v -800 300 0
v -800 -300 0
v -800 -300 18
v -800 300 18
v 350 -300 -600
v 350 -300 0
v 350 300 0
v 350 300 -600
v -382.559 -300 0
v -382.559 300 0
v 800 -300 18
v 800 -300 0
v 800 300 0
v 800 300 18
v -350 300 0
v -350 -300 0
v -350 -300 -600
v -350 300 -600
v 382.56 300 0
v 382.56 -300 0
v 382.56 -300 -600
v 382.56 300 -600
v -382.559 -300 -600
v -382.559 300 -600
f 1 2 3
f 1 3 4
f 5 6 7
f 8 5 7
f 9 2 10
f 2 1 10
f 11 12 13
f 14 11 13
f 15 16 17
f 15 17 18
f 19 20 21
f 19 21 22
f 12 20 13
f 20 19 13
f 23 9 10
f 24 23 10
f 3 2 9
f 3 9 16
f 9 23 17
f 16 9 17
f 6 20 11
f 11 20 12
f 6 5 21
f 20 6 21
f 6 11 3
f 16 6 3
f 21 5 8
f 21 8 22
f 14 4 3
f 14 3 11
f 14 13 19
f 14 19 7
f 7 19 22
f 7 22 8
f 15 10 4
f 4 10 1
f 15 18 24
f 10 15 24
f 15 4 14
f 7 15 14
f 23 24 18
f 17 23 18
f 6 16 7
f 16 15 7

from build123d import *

# Parameters (mm, degrees)
F0_W     = 32.559776
F0_H     = 600
F0_W_2   = 417.440581
F0_W_3   = 32.559419
F0_W_4   = 417.440224
F0_W_5   = 700
F1_DEPTH = 18
F2_DEPTH = 600


with BuildPart() as f1:
    # F0 (on Top) → F1 (new body)
    with BuildSketch(Plane.XY):
        with Locations((366.279888, 0)):
            Rectangle(F0_W, F0_H)
        with Locations((-591.279709, 0)):
            Rectangle(F0_W_2, F0_H)
        with Locations((-366.279709, 0)):
            Rectangle(F0_W_3, F0_H)
        with Locations((591.279888, 0)):
            Rectangle(F0_W_4, F0_H)
        Rectangle(F0_W_5, F0_H)
    extrude(amount=F1_DEPTH)

    # F0 (on Top) → F2 (join)
    with BuildSketch(Plane.XY):
        with Locations((-366.279709, 0)):
            Rectangle(F0_W_3, F0_H)
        with Locations((366.279888, 0)):
            Rectangle(F0_W, F0_H)
    extrude(amount=-F2_DEPTH)


solid = f1.part
